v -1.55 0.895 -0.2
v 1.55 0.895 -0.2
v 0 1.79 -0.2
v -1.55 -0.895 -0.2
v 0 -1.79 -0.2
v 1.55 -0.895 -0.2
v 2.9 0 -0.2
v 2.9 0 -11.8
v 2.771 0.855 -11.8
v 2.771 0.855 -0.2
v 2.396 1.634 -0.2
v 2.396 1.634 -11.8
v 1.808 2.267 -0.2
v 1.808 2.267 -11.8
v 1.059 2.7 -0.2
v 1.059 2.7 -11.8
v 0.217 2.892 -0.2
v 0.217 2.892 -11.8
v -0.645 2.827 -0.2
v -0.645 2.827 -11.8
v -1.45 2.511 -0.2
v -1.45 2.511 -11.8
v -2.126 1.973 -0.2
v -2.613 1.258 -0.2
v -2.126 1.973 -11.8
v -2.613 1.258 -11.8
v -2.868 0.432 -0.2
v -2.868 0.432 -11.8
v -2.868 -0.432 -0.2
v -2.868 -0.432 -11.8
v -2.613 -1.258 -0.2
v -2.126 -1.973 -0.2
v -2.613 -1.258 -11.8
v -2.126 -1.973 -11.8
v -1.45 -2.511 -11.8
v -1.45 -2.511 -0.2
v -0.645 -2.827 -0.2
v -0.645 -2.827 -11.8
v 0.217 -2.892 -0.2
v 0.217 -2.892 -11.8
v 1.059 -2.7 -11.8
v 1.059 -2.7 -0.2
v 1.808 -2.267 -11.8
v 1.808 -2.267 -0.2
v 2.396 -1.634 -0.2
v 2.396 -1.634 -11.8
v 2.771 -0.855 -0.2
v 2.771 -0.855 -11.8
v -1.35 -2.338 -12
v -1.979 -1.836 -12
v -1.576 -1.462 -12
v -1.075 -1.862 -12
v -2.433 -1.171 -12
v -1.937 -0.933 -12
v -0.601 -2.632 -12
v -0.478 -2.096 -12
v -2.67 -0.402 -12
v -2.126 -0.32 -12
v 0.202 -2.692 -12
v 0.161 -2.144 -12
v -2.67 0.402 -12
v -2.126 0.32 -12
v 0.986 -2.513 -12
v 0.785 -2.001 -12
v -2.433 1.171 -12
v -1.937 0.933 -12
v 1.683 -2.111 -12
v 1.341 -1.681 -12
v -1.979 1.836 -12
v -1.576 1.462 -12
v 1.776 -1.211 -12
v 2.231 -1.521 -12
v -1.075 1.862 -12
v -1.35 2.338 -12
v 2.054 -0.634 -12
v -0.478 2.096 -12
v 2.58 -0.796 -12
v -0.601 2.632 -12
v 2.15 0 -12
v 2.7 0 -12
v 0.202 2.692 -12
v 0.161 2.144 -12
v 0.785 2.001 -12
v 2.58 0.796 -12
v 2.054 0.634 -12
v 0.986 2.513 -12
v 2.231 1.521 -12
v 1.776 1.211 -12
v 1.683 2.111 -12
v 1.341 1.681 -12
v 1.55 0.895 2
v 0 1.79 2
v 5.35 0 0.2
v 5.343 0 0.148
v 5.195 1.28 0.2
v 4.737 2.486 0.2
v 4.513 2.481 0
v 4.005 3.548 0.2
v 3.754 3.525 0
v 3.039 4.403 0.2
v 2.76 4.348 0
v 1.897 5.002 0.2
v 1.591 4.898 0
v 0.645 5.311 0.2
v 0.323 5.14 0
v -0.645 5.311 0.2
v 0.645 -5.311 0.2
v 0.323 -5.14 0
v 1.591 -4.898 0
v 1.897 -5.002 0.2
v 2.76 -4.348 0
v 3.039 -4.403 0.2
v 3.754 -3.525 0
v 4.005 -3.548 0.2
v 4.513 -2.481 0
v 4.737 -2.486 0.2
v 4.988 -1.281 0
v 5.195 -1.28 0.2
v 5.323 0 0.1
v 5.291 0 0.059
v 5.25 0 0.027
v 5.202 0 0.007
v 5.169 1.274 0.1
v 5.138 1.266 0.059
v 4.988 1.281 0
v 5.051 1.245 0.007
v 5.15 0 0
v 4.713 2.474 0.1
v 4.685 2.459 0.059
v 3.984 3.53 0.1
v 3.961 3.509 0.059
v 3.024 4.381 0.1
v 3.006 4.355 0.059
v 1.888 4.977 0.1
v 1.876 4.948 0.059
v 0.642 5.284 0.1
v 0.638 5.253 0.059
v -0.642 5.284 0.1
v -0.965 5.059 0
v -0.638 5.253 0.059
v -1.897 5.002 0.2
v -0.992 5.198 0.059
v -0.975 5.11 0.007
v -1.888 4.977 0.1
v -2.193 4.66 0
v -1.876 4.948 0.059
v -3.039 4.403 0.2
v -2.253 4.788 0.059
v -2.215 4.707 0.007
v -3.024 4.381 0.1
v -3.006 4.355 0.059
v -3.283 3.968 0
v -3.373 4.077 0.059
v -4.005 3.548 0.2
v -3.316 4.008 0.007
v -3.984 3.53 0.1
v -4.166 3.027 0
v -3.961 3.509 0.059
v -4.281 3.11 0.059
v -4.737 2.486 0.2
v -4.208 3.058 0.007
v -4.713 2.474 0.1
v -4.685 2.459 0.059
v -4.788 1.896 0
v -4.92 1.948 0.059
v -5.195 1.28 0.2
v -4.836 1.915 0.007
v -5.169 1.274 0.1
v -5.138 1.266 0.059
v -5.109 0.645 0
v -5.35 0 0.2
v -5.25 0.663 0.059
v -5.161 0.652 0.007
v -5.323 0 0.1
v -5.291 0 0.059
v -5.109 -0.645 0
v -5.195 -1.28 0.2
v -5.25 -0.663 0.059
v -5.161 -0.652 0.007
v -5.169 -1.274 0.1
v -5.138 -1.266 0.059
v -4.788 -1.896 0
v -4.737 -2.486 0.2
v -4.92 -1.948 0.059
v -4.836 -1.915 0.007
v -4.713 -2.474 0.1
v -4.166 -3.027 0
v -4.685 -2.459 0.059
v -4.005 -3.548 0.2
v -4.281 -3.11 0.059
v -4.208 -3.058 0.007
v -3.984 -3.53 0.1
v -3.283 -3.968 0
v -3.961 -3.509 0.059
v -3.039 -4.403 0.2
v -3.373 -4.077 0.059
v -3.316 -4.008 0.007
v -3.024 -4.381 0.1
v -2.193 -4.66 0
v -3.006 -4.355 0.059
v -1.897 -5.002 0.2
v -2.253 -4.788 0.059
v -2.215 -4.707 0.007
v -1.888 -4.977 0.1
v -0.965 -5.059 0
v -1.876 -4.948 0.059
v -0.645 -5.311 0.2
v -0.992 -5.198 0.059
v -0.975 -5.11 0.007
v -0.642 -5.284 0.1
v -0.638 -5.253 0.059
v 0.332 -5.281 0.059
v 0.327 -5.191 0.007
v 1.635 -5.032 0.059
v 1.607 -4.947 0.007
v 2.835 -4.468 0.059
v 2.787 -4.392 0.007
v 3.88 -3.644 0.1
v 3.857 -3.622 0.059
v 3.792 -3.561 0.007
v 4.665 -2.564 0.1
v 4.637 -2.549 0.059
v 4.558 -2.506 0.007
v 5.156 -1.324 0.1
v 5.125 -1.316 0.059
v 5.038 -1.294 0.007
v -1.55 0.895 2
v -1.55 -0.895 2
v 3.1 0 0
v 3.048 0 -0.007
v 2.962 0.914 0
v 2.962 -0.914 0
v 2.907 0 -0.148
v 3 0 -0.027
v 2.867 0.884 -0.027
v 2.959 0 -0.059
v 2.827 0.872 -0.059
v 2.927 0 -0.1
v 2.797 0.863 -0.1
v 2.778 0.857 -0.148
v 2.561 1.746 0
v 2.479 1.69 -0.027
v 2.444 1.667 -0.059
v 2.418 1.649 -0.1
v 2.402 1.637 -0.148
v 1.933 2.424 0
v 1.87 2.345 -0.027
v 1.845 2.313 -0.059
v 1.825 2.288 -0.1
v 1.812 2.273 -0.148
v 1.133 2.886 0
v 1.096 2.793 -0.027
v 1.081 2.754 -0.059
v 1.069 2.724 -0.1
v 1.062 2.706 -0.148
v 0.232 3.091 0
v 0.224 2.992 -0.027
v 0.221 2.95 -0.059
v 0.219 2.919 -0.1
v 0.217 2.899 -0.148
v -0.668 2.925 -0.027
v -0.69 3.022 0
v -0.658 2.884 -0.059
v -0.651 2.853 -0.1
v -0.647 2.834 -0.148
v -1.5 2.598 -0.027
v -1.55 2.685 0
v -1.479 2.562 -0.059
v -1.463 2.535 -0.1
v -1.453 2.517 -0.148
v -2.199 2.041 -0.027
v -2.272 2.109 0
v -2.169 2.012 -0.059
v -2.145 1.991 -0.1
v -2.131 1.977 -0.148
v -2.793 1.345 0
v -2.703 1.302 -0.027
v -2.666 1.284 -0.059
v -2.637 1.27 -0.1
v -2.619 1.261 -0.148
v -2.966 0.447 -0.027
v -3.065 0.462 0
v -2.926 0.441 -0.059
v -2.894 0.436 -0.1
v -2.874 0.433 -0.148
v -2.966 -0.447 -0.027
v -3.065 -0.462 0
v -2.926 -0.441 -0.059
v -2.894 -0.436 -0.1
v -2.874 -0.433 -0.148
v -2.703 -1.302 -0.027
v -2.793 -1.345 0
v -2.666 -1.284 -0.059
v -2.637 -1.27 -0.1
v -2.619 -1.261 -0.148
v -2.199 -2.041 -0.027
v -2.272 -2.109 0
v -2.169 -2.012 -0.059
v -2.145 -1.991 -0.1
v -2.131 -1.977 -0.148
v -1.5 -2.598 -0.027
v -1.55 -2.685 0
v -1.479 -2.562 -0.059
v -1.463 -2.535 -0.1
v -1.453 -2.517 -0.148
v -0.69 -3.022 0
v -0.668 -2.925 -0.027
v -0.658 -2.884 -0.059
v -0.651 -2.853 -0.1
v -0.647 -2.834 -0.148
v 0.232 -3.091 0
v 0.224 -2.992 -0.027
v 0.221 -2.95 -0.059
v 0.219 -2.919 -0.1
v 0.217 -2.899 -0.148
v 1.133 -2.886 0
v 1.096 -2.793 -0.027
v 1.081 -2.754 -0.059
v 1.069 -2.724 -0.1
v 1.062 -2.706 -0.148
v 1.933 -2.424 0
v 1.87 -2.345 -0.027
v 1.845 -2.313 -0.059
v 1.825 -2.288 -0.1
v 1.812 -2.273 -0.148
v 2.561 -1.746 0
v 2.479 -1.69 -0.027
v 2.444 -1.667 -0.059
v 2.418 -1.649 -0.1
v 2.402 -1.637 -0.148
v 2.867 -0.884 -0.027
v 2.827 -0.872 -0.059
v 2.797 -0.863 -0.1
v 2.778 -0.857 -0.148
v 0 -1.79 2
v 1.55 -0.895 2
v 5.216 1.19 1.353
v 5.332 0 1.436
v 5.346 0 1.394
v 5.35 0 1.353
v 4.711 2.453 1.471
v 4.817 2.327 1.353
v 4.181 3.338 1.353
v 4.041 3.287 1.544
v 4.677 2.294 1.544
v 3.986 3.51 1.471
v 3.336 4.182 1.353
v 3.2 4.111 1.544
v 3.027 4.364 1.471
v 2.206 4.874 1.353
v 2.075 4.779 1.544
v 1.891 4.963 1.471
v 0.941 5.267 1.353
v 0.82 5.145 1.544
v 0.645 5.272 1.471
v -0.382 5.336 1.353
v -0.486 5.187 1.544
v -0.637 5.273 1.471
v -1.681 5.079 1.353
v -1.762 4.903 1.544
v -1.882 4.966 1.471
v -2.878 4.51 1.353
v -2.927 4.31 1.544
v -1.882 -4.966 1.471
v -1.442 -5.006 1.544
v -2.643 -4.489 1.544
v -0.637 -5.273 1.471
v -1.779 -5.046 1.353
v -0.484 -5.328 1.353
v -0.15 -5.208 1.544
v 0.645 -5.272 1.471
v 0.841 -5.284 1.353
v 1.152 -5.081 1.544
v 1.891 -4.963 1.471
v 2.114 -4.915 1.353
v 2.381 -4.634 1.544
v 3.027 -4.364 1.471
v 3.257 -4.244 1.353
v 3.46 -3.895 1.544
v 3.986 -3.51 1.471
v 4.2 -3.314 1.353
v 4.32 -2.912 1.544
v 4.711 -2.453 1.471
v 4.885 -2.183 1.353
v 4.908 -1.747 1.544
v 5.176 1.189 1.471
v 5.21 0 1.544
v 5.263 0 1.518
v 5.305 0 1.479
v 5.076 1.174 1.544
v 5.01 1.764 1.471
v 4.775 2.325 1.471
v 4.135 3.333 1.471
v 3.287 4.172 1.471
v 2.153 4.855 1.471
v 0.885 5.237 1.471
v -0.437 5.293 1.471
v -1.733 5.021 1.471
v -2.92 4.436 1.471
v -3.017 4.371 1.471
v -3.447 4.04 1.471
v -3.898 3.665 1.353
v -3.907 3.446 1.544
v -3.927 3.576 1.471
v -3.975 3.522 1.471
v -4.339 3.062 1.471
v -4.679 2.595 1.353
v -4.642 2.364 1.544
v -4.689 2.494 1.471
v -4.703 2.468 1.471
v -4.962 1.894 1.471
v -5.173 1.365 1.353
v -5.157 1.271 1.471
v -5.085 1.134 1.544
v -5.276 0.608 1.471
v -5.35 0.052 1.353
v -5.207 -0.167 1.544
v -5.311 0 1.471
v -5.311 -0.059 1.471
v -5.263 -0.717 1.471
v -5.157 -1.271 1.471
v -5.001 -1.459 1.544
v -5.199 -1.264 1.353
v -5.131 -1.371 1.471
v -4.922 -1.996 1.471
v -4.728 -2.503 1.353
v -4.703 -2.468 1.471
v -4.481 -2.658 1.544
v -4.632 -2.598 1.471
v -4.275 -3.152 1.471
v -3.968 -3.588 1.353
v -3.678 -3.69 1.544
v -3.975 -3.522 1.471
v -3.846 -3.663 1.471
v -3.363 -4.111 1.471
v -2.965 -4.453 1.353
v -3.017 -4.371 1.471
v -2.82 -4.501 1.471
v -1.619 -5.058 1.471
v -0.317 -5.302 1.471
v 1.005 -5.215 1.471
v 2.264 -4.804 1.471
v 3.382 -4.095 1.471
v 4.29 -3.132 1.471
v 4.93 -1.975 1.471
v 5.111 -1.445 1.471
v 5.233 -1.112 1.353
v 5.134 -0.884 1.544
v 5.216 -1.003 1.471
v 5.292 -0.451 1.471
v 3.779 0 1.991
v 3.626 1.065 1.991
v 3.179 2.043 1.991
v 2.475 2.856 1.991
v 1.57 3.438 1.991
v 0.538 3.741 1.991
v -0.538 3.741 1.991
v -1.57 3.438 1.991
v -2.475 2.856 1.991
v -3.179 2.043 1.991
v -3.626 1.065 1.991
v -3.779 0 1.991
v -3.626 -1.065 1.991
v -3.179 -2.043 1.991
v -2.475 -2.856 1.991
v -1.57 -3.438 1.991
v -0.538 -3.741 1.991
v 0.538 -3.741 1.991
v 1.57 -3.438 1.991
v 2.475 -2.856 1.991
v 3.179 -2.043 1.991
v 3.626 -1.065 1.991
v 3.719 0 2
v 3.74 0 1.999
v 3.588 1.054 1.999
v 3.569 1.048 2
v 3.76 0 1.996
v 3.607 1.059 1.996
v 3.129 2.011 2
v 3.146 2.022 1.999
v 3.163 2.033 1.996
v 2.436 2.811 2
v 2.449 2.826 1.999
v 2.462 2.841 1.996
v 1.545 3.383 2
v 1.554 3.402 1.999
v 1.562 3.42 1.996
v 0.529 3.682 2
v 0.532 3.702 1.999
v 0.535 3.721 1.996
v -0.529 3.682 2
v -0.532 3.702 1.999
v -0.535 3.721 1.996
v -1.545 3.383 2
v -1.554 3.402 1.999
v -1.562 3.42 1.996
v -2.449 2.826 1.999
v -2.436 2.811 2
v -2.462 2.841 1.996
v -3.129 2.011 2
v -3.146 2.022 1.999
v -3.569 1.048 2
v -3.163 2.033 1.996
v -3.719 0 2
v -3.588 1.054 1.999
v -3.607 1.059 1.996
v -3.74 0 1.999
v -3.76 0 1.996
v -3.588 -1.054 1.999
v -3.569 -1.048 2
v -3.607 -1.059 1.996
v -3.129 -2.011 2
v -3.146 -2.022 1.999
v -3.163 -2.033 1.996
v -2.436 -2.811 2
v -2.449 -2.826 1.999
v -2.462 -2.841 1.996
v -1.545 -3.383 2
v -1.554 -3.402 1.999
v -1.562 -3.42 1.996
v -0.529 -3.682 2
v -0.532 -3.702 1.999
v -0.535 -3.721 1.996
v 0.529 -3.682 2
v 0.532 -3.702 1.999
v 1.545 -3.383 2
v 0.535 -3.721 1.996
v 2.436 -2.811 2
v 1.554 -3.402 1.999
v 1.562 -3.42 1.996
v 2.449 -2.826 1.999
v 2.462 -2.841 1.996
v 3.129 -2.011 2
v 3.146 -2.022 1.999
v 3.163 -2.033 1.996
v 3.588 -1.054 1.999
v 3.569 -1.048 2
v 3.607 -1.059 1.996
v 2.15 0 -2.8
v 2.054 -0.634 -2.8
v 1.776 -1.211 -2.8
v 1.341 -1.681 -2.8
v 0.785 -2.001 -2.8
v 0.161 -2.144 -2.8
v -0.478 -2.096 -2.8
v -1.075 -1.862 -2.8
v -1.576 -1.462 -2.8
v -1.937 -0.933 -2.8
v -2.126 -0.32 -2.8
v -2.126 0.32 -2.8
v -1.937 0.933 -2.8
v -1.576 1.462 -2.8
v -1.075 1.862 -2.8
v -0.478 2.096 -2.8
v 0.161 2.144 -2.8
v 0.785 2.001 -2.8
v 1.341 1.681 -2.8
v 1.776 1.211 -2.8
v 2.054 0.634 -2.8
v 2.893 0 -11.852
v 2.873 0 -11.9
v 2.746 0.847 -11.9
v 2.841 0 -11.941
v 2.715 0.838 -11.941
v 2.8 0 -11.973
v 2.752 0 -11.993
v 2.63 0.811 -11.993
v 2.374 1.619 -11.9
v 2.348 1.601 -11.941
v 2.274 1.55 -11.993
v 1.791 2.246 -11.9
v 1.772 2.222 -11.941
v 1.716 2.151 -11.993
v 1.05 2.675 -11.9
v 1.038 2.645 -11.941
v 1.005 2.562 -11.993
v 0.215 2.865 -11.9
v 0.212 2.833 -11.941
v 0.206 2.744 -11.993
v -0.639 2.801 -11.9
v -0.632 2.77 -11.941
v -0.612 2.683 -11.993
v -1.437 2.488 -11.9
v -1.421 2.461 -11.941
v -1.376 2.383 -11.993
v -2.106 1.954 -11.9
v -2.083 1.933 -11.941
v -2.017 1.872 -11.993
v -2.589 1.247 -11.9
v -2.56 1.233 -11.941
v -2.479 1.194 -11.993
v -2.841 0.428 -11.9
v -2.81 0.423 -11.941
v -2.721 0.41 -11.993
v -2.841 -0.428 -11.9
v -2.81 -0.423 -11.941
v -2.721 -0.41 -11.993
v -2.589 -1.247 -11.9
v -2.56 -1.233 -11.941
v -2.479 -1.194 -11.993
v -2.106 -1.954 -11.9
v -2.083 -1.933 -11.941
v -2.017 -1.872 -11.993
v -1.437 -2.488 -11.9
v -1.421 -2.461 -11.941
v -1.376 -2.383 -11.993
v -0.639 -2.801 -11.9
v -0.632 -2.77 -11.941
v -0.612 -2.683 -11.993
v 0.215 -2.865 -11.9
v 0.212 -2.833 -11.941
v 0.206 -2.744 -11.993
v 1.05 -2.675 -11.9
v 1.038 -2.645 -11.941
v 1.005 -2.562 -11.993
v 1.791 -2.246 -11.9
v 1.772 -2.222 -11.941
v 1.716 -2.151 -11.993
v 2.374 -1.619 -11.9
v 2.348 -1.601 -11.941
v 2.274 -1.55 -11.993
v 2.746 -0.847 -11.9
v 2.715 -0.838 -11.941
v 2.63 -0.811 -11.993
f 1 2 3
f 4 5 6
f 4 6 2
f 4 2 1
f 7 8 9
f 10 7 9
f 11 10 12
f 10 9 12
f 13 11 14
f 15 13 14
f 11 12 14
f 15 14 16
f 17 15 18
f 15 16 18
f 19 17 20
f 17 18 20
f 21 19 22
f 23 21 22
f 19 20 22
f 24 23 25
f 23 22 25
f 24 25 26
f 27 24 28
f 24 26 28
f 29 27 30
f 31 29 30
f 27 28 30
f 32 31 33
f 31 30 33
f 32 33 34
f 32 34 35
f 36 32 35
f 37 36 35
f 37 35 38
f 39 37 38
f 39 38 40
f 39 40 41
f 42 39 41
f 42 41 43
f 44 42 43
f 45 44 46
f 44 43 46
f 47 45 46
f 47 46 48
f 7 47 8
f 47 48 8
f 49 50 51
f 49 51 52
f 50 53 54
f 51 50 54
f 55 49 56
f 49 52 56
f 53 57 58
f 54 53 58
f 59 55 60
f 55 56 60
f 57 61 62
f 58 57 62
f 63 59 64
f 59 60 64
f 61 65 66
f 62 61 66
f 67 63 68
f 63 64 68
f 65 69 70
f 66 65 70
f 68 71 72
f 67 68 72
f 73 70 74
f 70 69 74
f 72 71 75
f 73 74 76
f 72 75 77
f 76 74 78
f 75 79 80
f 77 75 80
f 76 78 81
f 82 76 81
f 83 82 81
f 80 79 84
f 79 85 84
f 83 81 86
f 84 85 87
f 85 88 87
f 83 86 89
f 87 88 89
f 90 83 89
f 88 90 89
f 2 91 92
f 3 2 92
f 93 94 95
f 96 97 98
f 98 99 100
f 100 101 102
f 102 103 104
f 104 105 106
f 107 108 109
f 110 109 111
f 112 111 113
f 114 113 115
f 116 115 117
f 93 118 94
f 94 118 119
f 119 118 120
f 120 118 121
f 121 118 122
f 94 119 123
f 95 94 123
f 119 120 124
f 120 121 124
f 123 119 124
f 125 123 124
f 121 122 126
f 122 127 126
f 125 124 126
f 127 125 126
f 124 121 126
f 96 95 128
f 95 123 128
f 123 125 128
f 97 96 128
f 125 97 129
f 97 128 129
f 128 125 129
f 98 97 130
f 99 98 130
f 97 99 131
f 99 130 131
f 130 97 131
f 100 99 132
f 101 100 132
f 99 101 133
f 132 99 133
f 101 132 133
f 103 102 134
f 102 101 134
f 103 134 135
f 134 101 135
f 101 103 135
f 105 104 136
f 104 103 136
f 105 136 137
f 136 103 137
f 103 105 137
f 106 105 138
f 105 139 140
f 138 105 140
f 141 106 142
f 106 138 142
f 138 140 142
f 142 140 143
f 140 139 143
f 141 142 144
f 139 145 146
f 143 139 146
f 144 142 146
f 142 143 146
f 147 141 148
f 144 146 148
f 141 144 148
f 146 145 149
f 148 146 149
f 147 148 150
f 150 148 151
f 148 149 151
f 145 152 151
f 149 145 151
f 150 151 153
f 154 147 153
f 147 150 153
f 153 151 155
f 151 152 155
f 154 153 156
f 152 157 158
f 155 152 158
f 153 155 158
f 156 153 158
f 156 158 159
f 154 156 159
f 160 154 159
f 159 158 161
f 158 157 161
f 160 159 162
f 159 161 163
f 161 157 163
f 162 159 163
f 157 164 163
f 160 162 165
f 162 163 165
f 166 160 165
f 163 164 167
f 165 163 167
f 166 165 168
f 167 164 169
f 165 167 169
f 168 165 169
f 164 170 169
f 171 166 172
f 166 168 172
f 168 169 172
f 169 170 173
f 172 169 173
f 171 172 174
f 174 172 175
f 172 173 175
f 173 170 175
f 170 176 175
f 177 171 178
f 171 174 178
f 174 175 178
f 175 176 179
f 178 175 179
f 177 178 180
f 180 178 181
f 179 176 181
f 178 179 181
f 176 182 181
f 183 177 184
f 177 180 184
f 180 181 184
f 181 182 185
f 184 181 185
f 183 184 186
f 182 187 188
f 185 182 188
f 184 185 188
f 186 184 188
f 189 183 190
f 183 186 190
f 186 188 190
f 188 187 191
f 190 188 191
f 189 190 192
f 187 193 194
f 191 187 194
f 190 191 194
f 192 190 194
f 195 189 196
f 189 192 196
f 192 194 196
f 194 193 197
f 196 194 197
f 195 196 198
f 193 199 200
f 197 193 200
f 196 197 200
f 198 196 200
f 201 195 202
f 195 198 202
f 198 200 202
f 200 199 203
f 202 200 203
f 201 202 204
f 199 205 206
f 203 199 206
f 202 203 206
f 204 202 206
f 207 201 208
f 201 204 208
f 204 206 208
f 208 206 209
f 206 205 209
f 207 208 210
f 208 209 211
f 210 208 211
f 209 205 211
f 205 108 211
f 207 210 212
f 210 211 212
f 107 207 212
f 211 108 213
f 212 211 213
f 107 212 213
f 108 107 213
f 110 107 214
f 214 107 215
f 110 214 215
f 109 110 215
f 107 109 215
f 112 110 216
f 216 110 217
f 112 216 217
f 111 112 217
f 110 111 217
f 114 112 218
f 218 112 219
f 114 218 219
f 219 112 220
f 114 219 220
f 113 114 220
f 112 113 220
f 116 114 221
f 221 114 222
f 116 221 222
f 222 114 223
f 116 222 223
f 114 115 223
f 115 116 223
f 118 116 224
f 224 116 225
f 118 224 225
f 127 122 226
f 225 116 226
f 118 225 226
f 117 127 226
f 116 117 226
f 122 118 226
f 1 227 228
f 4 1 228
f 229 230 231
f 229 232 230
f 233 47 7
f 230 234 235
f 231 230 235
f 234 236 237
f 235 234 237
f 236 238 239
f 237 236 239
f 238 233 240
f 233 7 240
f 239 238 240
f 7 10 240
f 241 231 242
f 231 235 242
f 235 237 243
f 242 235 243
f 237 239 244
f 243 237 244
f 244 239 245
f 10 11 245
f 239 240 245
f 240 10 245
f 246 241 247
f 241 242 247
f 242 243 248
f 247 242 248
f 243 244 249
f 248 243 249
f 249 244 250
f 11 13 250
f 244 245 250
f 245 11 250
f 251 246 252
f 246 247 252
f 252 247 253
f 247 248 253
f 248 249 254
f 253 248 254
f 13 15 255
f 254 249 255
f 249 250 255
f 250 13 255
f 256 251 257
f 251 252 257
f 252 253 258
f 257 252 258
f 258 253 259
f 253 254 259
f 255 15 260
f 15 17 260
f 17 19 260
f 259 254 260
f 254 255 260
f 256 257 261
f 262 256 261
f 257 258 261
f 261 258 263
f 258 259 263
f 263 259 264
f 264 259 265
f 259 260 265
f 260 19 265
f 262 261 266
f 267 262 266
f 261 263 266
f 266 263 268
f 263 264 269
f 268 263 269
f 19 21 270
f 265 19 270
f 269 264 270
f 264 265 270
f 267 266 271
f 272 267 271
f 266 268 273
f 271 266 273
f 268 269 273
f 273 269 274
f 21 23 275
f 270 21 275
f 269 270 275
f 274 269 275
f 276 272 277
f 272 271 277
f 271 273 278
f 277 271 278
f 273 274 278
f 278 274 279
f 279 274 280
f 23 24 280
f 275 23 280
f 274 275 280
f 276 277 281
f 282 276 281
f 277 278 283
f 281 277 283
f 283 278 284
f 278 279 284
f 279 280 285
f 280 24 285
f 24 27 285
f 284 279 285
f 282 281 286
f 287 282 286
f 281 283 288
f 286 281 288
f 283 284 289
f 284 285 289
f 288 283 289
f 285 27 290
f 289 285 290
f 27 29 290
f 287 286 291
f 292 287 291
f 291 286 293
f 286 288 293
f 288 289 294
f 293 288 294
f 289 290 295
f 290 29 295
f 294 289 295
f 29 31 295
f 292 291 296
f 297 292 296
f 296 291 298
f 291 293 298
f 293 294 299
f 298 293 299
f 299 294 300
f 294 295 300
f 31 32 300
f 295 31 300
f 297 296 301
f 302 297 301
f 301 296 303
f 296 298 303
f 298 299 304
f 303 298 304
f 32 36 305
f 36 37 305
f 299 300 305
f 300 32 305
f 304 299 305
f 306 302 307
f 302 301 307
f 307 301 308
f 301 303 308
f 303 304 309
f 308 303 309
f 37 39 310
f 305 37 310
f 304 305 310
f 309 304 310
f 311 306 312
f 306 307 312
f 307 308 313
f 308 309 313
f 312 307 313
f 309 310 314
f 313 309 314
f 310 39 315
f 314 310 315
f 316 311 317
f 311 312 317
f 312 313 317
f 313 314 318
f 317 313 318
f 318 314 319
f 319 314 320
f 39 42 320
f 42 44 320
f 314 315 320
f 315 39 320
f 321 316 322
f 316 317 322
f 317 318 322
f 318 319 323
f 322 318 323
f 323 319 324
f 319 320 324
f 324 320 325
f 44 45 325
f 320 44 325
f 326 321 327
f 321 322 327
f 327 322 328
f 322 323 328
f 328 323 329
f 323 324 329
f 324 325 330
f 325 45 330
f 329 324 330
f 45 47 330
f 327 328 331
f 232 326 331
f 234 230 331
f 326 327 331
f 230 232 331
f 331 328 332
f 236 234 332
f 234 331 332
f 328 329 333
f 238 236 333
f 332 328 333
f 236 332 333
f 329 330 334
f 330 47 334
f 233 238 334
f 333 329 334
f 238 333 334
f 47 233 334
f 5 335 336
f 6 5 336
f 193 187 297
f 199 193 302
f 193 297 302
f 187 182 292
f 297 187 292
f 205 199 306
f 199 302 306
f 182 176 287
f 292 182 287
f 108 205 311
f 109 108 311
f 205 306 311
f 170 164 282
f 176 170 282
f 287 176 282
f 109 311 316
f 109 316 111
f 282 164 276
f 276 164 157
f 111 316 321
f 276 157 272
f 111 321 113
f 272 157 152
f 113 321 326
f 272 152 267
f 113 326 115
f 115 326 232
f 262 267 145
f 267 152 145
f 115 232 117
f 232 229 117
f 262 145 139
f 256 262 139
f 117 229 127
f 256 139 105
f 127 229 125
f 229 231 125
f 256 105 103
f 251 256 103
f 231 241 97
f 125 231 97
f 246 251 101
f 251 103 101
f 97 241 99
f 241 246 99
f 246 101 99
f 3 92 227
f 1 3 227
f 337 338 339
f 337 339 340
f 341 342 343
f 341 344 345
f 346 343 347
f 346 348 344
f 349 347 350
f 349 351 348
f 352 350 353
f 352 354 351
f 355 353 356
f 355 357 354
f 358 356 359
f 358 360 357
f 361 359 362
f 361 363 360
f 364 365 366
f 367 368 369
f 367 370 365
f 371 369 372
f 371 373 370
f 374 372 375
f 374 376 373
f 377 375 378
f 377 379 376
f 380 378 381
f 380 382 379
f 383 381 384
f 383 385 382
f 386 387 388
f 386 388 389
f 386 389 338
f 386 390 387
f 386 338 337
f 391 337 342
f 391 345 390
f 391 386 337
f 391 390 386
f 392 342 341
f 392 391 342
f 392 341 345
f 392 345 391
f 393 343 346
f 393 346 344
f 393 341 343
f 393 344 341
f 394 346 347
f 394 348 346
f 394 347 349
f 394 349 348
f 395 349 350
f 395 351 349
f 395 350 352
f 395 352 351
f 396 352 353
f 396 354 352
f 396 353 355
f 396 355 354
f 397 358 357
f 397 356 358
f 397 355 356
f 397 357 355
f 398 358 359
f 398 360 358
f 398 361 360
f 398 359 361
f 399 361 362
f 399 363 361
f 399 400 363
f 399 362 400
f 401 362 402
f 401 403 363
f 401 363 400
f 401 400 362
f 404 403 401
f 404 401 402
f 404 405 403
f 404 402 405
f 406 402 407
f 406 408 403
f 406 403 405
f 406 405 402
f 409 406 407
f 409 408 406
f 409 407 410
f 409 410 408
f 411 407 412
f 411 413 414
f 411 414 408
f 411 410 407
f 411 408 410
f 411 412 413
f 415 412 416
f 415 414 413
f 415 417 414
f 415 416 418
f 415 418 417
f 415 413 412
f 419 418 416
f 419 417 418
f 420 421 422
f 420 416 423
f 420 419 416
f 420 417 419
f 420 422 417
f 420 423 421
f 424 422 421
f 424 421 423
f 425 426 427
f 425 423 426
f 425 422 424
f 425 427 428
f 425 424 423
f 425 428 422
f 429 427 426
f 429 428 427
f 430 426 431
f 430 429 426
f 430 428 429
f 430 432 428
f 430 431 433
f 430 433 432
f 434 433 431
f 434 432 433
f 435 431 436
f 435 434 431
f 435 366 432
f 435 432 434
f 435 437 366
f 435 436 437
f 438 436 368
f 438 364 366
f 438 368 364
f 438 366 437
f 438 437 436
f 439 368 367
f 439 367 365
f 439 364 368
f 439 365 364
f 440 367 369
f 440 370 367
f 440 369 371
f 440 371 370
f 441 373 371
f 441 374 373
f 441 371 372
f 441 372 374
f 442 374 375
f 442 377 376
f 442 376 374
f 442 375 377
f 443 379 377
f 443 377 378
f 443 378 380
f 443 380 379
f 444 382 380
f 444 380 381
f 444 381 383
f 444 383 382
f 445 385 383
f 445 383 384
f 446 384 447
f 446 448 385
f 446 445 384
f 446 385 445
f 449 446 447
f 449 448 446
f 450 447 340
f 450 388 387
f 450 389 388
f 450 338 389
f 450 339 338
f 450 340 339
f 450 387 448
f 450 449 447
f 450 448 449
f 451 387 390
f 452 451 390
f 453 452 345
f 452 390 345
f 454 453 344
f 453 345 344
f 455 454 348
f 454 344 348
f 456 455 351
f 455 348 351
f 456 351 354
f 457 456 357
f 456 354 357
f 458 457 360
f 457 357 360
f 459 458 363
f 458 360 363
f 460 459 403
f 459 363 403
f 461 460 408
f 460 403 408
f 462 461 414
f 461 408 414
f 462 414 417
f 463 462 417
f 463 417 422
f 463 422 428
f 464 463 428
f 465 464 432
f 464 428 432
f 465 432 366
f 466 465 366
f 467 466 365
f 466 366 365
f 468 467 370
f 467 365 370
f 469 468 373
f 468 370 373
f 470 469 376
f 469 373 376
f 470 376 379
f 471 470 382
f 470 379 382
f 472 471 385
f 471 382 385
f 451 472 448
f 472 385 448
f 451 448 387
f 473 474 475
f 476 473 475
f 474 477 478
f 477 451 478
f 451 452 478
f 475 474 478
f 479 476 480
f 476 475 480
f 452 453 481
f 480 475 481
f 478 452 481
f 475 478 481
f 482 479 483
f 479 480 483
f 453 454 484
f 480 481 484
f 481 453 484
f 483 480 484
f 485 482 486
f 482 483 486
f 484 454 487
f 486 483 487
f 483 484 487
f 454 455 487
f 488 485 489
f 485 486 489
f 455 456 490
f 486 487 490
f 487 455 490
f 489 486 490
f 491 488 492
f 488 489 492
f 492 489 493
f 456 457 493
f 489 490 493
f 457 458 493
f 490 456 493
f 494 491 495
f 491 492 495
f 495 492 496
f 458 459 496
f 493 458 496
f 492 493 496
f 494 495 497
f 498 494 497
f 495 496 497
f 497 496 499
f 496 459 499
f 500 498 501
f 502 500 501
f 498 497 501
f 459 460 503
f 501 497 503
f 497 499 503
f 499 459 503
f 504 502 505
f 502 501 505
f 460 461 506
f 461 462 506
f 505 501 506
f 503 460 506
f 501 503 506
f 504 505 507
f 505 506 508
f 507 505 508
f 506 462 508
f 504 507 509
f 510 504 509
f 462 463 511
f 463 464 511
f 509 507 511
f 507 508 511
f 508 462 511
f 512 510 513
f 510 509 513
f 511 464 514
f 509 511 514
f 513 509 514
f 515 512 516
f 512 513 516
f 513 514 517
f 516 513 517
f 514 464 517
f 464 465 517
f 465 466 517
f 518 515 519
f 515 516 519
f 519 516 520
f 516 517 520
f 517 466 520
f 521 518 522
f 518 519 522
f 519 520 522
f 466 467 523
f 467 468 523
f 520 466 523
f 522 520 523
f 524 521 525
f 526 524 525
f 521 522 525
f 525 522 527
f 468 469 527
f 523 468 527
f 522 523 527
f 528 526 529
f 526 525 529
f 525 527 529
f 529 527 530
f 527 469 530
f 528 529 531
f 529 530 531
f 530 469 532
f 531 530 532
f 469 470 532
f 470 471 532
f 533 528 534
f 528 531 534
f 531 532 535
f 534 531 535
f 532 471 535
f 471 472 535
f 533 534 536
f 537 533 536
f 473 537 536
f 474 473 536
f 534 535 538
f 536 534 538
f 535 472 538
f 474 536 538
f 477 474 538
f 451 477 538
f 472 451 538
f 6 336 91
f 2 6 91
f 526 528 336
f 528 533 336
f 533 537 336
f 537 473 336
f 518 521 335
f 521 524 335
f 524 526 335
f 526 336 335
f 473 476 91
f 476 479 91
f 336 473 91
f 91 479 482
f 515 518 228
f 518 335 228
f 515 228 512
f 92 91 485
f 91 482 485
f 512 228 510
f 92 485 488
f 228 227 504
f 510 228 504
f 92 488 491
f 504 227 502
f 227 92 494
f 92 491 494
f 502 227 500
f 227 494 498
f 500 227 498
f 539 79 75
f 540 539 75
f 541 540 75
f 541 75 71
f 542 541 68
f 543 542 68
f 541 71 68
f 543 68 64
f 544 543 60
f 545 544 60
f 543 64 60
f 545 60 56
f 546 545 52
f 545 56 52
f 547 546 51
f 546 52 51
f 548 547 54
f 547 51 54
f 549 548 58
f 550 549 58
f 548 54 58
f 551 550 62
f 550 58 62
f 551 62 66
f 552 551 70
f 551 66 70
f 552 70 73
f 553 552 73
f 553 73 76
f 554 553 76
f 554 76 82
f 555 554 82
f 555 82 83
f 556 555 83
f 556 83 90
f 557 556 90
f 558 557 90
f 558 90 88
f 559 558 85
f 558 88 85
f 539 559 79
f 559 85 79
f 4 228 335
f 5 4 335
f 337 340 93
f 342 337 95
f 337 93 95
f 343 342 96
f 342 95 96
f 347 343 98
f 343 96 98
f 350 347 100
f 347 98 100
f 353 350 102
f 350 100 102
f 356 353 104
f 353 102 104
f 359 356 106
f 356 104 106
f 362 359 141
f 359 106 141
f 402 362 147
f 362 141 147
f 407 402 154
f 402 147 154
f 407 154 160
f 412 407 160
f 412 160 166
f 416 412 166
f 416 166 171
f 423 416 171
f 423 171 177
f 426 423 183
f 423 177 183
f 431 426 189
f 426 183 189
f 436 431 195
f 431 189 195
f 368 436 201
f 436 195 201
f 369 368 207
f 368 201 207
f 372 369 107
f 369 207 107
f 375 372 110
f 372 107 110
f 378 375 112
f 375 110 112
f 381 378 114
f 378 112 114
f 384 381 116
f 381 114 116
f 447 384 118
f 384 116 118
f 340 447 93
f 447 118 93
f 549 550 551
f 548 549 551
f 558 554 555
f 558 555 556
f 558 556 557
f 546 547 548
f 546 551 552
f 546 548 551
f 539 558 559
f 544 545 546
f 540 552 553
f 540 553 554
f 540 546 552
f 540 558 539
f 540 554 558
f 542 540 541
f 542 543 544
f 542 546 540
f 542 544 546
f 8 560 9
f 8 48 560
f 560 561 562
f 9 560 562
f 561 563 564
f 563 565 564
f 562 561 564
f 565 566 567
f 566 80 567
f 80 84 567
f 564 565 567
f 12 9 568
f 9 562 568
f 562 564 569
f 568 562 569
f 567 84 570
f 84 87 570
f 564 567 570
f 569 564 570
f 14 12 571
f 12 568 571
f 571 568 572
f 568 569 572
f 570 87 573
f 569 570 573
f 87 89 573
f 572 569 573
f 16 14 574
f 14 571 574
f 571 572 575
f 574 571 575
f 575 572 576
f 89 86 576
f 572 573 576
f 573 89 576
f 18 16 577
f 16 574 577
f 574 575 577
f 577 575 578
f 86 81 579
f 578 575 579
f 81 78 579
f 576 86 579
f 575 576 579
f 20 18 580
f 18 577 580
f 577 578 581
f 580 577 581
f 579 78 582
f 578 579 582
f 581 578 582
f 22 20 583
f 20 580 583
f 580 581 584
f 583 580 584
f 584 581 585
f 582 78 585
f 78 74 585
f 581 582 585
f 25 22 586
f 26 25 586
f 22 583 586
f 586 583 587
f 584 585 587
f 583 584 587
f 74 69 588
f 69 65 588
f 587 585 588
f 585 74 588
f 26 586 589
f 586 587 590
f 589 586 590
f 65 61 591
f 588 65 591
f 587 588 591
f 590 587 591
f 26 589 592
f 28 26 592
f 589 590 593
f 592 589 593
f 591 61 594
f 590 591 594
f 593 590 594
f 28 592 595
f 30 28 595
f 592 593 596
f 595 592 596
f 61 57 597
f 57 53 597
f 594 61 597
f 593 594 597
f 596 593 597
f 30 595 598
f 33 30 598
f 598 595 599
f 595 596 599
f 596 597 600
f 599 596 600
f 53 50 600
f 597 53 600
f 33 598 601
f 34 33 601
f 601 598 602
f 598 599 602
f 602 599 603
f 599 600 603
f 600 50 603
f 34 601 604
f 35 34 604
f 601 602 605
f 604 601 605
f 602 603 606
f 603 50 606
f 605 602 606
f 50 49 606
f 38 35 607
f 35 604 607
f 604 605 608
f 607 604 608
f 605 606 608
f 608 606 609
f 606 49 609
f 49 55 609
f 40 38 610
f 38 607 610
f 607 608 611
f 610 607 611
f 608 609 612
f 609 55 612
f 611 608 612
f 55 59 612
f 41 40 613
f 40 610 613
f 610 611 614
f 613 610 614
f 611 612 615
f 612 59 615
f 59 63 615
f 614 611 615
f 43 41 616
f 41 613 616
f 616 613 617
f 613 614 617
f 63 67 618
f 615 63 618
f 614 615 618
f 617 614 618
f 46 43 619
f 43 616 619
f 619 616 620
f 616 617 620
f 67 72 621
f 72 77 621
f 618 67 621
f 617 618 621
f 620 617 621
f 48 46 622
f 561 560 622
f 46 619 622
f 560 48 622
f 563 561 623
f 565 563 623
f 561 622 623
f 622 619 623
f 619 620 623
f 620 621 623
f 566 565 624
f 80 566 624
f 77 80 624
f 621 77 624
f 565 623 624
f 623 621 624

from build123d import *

# Parameters (mm, degrees)
SKETCH001_R     = 2.15
POCKET_DEPTH    = 9.2
POCKET001_DEPTH = 2.2
FILLET_R        = 0.2


with BuildPart() as part:
    # Sketch → Revolution (revolve)
    with BuildSketch(Plane.XZ):
        Polygon((0, -12), (0, 2), (3.75, 2), (5.35, 1.5), (5.35, 0), (2.9, 0), (2.9, -12), align=None)
    revolve(axis=Axis((0, 0, 0), (0, 0, 1)))

    # Sketch001 (on Face6 of Revolution) → Pocket (cut)
    with BuildSketch(Plane(origin=(0, 0, -12), x_dir=(1, 0, 0), z_dir=(0, 0, -1))):
        Circle(SKETCH001_R)
    extrude(amount=-POCKET_DEPTH, mode=Mode.SUBTRACT)

    # Sketch002 (on Face1 of Pocket) → Pocket001 (cut)
    with BuildSketch(Plane(origin=(0, 0, 2), x_dir=(-1, 0, 0), z_dir=(0, 0, 1))):
        Polygon((1.55, 0.894893), (0, 1.789786), (-1.55, 0.894893), (-1.55, -0.894893), (0, -1.789786), (1.55, -0.894893), align=None)
    extrude(amount=-POCKET001_DEPTH, mode=Mode.SUBTRACT)

    # Fillet
    fillet_edges = [part.edges().sort_by_distance(p)[0] for p in [
        (-5.35, 0, 0),
        (-5.35, 0, 1.5),
        (-3.75, 0, 2),
        (-2.9, 0, -12),
        (-2.9, 0, 0),
    ]]
    fillet(fillet_edges, radius=FILLET_R)


solid = part.part
